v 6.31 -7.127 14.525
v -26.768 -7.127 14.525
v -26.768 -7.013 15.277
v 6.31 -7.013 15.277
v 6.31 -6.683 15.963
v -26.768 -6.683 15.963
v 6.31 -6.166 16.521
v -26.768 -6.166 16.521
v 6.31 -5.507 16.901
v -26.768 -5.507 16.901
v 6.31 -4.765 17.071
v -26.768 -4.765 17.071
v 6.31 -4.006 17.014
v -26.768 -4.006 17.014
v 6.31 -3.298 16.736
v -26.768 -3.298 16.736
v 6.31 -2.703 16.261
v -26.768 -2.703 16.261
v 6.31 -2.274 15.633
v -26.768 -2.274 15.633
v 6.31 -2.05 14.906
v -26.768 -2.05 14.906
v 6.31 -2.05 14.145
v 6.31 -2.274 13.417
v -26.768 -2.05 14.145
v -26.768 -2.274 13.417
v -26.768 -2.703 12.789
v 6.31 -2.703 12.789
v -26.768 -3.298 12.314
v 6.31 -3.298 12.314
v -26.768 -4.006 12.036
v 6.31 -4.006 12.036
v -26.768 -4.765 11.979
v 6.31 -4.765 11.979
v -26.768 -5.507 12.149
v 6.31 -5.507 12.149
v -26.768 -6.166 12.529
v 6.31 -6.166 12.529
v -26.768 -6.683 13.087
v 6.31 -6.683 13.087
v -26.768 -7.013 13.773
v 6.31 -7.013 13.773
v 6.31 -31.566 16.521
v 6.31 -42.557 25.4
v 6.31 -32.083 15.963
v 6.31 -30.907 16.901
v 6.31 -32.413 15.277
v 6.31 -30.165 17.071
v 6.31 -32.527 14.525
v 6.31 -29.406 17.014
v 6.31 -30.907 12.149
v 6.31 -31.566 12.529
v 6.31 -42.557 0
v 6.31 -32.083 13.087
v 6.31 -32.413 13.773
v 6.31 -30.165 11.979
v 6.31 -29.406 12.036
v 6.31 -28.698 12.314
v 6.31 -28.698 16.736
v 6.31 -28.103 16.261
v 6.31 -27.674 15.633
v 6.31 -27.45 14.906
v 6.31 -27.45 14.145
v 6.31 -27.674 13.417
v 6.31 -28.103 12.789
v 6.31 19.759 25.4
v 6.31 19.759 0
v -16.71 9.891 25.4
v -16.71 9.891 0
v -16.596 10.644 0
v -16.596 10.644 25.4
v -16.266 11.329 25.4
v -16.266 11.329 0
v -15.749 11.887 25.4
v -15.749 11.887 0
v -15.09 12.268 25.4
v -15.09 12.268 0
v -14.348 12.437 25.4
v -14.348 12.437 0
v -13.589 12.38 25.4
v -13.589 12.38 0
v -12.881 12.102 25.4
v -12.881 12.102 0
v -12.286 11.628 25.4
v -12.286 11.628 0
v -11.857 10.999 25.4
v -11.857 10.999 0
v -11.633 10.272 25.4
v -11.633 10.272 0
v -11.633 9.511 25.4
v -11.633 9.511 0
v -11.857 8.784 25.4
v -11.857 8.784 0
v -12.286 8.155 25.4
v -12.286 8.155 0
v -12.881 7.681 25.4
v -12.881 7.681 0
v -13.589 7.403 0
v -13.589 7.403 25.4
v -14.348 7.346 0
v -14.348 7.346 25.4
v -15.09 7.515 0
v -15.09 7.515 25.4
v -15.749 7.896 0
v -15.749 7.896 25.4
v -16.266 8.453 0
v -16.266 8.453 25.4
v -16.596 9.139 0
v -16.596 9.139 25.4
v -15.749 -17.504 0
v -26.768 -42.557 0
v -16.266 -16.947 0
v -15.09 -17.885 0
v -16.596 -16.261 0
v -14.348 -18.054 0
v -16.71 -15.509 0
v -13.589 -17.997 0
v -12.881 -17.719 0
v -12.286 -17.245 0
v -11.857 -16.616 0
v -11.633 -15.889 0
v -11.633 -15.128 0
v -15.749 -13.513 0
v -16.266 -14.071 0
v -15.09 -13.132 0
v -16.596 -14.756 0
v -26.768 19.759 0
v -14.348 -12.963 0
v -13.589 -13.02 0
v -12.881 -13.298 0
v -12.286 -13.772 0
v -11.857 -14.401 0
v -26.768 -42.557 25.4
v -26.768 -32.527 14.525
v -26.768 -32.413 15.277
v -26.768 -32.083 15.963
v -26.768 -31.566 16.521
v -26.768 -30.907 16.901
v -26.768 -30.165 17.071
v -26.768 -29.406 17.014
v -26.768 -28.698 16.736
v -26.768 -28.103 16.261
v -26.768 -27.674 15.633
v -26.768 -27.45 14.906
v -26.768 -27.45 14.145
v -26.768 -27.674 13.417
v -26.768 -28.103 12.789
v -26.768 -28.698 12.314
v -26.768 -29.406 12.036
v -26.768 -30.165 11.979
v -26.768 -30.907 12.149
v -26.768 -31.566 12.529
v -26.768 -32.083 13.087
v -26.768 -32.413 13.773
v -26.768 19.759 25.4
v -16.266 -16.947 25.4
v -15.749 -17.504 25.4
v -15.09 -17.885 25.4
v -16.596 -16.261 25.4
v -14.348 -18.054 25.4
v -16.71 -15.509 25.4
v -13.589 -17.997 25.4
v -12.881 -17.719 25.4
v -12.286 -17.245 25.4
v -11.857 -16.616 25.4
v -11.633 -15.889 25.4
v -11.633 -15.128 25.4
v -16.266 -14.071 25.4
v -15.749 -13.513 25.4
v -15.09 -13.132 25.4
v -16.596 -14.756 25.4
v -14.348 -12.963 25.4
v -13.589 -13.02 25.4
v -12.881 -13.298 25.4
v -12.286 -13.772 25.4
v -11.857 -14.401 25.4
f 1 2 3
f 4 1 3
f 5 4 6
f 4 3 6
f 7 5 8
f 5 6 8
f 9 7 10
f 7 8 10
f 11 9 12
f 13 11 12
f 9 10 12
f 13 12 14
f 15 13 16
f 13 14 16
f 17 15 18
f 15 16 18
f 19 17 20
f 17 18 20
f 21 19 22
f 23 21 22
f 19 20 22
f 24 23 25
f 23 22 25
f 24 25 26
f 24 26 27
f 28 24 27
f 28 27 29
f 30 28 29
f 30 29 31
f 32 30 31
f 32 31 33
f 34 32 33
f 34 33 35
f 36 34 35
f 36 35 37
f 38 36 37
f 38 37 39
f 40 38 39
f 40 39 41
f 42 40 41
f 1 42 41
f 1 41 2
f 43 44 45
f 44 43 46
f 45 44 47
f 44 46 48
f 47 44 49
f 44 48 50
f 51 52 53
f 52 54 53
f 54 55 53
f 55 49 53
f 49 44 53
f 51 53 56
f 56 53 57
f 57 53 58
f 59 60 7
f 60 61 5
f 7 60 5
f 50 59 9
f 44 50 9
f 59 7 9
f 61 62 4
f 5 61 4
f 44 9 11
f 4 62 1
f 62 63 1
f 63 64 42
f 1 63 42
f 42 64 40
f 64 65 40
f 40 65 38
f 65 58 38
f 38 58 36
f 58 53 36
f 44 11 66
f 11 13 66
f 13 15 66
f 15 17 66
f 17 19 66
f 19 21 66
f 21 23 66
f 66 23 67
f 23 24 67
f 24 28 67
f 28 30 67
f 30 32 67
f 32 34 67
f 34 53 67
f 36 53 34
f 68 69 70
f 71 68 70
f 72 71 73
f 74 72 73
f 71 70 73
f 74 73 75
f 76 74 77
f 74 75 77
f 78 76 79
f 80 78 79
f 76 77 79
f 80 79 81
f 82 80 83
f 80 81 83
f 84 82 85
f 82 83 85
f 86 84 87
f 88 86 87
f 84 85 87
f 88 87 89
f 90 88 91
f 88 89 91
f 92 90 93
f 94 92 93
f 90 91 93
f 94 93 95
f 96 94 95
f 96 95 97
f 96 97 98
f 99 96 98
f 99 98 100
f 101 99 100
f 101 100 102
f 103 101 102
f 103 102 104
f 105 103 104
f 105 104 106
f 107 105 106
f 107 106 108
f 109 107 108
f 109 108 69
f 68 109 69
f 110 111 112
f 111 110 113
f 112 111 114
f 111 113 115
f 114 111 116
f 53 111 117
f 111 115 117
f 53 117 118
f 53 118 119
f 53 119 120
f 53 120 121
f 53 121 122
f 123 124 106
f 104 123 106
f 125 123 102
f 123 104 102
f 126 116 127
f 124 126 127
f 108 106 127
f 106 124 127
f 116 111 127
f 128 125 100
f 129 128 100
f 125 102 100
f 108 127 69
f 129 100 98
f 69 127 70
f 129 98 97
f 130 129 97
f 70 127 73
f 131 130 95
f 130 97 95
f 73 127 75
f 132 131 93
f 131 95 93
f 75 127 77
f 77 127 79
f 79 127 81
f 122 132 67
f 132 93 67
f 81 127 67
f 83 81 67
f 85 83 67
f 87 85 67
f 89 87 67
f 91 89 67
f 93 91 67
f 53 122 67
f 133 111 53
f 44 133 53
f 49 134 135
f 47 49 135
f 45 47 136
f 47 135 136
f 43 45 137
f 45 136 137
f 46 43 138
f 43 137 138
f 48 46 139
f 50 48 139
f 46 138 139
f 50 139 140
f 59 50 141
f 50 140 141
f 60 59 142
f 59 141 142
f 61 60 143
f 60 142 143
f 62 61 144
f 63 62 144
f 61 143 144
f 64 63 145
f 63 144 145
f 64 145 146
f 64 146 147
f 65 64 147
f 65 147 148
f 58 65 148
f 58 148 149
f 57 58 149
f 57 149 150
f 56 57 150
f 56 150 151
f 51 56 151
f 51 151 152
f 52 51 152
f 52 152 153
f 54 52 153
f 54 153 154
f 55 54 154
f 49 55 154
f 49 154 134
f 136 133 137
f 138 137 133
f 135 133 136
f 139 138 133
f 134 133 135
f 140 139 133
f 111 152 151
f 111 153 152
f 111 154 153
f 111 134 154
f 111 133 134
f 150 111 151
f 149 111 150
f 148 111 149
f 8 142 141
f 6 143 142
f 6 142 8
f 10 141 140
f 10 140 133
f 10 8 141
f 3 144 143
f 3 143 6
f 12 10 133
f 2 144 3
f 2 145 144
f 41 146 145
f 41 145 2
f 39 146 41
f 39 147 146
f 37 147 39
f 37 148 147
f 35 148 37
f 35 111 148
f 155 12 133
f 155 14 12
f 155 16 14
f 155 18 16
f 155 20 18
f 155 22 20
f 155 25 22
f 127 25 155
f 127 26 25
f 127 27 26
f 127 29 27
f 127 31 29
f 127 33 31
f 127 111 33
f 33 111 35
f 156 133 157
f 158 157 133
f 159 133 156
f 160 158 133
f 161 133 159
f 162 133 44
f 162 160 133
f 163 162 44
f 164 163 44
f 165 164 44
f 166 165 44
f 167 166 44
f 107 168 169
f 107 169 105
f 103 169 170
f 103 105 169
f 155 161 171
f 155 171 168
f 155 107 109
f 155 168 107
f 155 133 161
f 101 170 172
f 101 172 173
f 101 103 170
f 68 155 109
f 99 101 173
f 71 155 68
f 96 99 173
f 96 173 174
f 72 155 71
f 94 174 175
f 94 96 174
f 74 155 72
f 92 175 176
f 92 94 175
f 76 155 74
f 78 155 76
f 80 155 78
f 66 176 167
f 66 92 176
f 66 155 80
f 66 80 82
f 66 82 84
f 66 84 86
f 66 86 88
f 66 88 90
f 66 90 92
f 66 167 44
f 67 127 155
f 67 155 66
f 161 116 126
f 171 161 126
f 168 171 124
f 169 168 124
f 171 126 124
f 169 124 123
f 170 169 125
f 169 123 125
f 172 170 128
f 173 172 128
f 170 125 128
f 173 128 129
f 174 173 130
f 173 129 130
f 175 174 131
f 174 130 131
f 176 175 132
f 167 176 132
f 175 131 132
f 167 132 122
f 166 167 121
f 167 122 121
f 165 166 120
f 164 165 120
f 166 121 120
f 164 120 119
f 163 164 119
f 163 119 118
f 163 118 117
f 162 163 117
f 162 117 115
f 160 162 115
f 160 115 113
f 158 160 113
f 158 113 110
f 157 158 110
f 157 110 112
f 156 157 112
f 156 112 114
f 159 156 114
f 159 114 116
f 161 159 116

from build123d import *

# Parameters (mm, degrees)
F0_W     = 33.077959
F0_H     = 62.316516
F1_DEPTH = 25.4
F4_D     = 5.1054
F5_D     = 5.1054


with BuildPart() as f1:
    # F0 (on Top) → F1 (new body)
    with BuildSketch(Plane.XY):
        with Locations((-10.229463, -11.399078)):
            Rectangle(F0_W, F0_H)
    extrude(amount=F1_DEPTH)

    # F4 (through all)
    with Locations(Plane.YZ.offset(6.309517)):
        with Locations((-29.974079, 14.525045), (-4.574079, 14.525045)):
            Hole(F4_D / 2)

    # F5 (through all)
    with Locations(Plane.XY.offset(25.4)):
        with Locations((-14.157081, 9.891412), (-14.157081, -15.508588)):
            Hole(F5_D / 2)


solid = f1.part
